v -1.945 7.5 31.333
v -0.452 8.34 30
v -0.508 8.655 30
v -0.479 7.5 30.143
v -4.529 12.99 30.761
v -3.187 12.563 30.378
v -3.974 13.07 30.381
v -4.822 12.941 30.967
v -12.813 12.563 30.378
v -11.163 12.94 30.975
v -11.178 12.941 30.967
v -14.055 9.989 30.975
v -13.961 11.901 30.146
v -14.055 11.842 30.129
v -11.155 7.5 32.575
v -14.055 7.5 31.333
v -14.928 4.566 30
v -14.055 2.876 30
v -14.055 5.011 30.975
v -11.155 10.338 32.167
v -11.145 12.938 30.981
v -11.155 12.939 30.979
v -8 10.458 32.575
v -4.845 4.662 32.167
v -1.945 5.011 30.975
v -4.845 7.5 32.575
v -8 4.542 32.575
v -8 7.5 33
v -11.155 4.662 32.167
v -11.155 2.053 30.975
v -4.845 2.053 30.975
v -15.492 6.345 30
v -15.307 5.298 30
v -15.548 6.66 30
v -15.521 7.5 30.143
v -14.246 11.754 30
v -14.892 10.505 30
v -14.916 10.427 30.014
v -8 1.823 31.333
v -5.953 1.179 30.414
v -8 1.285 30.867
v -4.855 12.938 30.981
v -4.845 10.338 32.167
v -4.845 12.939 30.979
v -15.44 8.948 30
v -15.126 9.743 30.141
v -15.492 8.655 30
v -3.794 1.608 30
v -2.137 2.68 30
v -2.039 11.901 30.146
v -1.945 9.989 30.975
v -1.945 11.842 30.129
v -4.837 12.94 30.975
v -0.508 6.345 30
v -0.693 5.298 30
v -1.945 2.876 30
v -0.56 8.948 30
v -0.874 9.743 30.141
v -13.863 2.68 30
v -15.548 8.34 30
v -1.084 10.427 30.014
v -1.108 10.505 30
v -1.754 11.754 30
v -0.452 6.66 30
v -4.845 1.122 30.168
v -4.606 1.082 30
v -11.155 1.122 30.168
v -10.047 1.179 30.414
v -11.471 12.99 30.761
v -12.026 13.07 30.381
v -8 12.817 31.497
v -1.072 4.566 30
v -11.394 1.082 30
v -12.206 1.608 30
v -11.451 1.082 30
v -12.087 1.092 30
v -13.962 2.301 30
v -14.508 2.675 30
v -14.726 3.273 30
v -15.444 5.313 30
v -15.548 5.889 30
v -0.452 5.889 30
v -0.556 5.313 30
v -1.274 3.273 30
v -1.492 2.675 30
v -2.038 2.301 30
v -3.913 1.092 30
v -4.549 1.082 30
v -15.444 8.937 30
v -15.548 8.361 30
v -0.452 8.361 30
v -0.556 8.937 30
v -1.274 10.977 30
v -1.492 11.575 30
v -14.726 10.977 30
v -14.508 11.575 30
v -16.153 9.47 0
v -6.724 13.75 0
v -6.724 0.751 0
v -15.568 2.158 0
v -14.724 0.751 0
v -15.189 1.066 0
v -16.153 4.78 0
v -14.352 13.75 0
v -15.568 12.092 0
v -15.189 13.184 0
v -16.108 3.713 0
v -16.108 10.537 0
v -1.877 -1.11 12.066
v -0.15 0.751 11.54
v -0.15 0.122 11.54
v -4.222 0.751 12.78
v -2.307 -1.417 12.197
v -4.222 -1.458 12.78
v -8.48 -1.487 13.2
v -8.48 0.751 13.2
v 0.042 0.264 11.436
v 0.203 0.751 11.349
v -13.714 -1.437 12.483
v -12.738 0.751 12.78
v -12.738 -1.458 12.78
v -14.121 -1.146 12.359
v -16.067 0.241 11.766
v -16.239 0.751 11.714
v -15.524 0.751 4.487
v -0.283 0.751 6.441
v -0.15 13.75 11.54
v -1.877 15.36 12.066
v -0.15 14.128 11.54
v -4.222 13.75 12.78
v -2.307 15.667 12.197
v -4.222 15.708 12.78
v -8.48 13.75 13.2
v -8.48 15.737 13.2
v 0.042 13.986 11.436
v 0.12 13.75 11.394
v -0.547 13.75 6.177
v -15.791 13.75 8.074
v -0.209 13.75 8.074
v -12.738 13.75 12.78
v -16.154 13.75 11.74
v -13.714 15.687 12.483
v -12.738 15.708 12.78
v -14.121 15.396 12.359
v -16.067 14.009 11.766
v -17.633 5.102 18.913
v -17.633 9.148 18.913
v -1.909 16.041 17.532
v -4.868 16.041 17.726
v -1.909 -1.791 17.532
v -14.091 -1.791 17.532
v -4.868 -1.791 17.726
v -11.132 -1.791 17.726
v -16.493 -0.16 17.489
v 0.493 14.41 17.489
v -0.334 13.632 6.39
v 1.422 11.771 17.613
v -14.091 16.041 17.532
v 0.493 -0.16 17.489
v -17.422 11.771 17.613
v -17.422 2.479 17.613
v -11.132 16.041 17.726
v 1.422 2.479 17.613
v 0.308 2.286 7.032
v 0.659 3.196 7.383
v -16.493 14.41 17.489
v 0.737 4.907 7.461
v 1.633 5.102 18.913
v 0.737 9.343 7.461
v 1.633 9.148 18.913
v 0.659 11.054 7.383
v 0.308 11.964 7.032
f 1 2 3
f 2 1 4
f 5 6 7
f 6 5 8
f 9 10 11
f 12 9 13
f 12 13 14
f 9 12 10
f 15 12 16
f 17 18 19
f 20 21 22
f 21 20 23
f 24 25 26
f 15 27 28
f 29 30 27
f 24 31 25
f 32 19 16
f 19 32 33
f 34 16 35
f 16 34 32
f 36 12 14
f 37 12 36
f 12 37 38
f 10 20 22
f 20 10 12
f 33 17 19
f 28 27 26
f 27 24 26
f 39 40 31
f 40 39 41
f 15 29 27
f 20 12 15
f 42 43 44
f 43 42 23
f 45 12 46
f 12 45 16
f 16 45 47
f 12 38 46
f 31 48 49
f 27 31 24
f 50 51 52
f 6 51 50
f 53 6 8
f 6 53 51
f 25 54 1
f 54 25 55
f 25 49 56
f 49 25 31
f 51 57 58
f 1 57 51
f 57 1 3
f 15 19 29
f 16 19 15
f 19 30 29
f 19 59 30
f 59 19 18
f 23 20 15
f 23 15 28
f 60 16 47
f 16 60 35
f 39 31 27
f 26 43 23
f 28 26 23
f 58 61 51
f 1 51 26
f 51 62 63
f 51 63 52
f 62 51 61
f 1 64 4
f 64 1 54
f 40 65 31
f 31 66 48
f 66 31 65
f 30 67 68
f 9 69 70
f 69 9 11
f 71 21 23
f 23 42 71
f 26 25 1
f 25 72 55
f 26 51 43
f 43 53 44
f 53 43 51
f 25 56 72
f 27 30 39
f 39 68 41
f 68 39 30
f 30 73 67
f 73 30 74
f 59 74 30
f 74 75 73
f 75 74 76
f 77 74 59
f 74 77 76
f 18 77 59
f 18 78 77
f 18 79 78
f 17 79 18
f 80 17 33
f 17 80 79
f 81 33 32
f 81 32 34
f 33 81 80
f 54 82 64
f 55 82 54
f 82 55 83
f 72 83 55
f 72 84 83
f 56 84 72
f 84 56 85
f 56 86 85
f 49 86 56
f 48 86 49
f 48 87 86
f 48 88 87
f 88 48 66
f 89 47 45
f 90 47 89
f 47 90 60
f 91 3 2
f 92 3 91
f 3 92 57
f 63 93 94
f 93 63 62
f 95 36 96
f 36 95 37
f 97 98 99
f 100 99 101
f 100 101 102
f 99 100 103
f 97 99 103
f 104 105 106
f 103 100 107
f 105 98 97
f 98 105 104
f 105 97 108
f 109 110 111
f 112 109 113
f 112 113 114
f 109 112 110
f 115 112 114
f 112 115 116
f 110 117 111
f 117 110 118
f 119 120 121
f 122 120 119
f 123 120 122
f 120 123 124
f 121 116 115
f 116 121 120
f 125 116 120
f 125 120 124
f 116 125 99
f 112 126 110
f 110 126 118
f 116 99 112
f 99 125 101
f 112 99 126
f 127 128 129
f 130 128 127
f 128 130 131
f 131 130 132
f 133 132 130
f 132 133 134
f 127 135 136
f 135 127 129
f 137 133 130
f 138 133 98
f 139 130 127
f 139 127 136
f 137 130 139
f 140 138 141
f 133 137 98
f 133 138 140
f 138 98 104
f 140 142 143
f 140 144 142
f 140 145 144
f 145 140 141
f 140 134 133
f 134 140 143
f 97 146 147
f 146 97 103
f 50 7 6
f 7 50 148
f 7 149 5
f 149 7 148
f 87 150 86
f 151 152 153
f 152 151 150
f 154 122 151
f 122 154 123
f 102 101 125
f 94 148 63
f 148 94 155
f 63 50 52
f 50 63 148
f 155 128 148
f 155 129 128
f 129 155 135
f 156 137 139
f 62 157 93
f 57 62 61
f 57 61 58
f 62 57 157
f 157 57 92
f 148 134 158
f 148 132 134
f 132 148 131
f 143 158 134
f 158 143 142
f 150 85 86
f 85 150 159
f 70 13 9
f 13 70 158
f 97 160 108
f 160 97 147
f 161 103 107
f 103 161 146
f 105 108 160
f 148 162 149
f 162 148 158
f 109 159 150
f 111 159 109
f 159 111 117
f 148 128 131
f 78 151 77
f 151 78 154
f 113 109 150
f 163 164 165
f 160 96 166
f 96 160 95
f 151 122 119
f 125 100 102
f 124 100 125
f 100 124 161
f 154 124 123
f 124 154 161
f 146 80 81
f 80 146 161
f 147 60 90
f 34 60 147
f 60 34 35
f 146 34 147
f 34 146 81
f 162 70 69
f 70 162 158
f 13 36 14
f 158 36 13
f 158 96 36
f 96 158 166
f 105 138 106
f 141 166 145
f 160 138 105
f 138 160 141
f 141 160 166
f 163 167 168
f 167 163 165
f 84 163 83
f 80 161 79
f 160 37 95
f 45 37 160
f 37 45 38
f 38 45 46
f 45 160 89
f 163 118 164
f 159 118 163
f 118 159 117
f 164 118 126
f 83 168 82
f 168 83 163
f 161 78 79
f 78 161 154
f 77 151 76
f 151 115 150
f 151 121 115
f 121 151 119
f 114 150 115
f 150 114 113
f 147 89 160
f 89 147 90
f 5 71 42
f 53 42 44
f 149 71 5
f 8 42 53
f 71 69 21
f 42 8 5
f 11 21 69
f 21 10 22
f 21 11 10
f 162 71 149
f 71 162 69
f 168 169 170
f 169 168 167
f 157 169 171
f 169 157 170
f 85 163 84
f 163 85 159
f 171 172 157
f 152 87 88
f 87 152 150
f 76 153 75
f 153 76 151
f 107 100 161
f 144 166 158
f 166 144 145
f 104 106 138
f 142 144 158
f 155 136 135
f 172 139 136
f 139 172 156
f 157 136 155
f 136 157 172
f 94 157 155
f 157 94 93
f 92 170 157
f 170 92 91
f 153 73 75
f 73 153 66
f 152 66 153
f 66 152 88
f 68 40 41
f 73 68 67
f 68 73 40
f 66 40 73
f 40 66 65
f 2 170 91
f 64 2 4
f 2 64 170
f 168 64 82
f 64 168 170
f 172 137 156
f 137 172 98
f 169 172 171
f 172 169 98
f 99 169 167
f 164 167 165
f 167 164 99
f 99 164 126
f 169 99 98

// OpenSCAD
module fingertip(length,x,y,z,padding,width)
{ 
	difference() {
		scale([y,x,z]) {
			intersection() {
                difference() {
                    union() {
                        translate([length-5,5,5]) sphere(r =7);
                        translate([0,-5,-5]) cube([length,width + 10,20]);
                    }
                    //cutout for the side
                        translate([-4,-width+0.001,5.3]) rotate([-90,0,0]) cylinder(r=12.8,h=10);
                        translate([-4,width - padding*(1/x),5.3]) rotate([-90,0,0]) cylinder(r=12.8,h=10);
                }
                hull() {
                    for(i=[-1,1], j=[-1,1]) {
                        //angled cylinders to provide the outer shape of the finger
                        translate([length/10,i*2.4 + width/2,j*2.2 + 5]) rotate([i*j*-4,j*86,0]) cylinder(d=6,h=20,center=true);
                        //tip part
                        translate([length-3, i + width/2, j*2.2 + 5])rotate([i*j*-4,j*-80,0]) cylinder(d=6,h=10,center=true);  
                    }
                }              
            } 
		}
        translate([0,padding/2 * x,0])              
        cut_fingerbase(width-padding,x,z);
	}
}

module cut_fingerbase(width,x,z) {
	translate([-13/z,0,0]) rotate([0,45,0]) translate([-50,0,0]) cube([100,width*x, 10.5]);
}

rotate([0,-90,0]) fingertip(20,1.5,1.5,1.6,0.5,9.5);
